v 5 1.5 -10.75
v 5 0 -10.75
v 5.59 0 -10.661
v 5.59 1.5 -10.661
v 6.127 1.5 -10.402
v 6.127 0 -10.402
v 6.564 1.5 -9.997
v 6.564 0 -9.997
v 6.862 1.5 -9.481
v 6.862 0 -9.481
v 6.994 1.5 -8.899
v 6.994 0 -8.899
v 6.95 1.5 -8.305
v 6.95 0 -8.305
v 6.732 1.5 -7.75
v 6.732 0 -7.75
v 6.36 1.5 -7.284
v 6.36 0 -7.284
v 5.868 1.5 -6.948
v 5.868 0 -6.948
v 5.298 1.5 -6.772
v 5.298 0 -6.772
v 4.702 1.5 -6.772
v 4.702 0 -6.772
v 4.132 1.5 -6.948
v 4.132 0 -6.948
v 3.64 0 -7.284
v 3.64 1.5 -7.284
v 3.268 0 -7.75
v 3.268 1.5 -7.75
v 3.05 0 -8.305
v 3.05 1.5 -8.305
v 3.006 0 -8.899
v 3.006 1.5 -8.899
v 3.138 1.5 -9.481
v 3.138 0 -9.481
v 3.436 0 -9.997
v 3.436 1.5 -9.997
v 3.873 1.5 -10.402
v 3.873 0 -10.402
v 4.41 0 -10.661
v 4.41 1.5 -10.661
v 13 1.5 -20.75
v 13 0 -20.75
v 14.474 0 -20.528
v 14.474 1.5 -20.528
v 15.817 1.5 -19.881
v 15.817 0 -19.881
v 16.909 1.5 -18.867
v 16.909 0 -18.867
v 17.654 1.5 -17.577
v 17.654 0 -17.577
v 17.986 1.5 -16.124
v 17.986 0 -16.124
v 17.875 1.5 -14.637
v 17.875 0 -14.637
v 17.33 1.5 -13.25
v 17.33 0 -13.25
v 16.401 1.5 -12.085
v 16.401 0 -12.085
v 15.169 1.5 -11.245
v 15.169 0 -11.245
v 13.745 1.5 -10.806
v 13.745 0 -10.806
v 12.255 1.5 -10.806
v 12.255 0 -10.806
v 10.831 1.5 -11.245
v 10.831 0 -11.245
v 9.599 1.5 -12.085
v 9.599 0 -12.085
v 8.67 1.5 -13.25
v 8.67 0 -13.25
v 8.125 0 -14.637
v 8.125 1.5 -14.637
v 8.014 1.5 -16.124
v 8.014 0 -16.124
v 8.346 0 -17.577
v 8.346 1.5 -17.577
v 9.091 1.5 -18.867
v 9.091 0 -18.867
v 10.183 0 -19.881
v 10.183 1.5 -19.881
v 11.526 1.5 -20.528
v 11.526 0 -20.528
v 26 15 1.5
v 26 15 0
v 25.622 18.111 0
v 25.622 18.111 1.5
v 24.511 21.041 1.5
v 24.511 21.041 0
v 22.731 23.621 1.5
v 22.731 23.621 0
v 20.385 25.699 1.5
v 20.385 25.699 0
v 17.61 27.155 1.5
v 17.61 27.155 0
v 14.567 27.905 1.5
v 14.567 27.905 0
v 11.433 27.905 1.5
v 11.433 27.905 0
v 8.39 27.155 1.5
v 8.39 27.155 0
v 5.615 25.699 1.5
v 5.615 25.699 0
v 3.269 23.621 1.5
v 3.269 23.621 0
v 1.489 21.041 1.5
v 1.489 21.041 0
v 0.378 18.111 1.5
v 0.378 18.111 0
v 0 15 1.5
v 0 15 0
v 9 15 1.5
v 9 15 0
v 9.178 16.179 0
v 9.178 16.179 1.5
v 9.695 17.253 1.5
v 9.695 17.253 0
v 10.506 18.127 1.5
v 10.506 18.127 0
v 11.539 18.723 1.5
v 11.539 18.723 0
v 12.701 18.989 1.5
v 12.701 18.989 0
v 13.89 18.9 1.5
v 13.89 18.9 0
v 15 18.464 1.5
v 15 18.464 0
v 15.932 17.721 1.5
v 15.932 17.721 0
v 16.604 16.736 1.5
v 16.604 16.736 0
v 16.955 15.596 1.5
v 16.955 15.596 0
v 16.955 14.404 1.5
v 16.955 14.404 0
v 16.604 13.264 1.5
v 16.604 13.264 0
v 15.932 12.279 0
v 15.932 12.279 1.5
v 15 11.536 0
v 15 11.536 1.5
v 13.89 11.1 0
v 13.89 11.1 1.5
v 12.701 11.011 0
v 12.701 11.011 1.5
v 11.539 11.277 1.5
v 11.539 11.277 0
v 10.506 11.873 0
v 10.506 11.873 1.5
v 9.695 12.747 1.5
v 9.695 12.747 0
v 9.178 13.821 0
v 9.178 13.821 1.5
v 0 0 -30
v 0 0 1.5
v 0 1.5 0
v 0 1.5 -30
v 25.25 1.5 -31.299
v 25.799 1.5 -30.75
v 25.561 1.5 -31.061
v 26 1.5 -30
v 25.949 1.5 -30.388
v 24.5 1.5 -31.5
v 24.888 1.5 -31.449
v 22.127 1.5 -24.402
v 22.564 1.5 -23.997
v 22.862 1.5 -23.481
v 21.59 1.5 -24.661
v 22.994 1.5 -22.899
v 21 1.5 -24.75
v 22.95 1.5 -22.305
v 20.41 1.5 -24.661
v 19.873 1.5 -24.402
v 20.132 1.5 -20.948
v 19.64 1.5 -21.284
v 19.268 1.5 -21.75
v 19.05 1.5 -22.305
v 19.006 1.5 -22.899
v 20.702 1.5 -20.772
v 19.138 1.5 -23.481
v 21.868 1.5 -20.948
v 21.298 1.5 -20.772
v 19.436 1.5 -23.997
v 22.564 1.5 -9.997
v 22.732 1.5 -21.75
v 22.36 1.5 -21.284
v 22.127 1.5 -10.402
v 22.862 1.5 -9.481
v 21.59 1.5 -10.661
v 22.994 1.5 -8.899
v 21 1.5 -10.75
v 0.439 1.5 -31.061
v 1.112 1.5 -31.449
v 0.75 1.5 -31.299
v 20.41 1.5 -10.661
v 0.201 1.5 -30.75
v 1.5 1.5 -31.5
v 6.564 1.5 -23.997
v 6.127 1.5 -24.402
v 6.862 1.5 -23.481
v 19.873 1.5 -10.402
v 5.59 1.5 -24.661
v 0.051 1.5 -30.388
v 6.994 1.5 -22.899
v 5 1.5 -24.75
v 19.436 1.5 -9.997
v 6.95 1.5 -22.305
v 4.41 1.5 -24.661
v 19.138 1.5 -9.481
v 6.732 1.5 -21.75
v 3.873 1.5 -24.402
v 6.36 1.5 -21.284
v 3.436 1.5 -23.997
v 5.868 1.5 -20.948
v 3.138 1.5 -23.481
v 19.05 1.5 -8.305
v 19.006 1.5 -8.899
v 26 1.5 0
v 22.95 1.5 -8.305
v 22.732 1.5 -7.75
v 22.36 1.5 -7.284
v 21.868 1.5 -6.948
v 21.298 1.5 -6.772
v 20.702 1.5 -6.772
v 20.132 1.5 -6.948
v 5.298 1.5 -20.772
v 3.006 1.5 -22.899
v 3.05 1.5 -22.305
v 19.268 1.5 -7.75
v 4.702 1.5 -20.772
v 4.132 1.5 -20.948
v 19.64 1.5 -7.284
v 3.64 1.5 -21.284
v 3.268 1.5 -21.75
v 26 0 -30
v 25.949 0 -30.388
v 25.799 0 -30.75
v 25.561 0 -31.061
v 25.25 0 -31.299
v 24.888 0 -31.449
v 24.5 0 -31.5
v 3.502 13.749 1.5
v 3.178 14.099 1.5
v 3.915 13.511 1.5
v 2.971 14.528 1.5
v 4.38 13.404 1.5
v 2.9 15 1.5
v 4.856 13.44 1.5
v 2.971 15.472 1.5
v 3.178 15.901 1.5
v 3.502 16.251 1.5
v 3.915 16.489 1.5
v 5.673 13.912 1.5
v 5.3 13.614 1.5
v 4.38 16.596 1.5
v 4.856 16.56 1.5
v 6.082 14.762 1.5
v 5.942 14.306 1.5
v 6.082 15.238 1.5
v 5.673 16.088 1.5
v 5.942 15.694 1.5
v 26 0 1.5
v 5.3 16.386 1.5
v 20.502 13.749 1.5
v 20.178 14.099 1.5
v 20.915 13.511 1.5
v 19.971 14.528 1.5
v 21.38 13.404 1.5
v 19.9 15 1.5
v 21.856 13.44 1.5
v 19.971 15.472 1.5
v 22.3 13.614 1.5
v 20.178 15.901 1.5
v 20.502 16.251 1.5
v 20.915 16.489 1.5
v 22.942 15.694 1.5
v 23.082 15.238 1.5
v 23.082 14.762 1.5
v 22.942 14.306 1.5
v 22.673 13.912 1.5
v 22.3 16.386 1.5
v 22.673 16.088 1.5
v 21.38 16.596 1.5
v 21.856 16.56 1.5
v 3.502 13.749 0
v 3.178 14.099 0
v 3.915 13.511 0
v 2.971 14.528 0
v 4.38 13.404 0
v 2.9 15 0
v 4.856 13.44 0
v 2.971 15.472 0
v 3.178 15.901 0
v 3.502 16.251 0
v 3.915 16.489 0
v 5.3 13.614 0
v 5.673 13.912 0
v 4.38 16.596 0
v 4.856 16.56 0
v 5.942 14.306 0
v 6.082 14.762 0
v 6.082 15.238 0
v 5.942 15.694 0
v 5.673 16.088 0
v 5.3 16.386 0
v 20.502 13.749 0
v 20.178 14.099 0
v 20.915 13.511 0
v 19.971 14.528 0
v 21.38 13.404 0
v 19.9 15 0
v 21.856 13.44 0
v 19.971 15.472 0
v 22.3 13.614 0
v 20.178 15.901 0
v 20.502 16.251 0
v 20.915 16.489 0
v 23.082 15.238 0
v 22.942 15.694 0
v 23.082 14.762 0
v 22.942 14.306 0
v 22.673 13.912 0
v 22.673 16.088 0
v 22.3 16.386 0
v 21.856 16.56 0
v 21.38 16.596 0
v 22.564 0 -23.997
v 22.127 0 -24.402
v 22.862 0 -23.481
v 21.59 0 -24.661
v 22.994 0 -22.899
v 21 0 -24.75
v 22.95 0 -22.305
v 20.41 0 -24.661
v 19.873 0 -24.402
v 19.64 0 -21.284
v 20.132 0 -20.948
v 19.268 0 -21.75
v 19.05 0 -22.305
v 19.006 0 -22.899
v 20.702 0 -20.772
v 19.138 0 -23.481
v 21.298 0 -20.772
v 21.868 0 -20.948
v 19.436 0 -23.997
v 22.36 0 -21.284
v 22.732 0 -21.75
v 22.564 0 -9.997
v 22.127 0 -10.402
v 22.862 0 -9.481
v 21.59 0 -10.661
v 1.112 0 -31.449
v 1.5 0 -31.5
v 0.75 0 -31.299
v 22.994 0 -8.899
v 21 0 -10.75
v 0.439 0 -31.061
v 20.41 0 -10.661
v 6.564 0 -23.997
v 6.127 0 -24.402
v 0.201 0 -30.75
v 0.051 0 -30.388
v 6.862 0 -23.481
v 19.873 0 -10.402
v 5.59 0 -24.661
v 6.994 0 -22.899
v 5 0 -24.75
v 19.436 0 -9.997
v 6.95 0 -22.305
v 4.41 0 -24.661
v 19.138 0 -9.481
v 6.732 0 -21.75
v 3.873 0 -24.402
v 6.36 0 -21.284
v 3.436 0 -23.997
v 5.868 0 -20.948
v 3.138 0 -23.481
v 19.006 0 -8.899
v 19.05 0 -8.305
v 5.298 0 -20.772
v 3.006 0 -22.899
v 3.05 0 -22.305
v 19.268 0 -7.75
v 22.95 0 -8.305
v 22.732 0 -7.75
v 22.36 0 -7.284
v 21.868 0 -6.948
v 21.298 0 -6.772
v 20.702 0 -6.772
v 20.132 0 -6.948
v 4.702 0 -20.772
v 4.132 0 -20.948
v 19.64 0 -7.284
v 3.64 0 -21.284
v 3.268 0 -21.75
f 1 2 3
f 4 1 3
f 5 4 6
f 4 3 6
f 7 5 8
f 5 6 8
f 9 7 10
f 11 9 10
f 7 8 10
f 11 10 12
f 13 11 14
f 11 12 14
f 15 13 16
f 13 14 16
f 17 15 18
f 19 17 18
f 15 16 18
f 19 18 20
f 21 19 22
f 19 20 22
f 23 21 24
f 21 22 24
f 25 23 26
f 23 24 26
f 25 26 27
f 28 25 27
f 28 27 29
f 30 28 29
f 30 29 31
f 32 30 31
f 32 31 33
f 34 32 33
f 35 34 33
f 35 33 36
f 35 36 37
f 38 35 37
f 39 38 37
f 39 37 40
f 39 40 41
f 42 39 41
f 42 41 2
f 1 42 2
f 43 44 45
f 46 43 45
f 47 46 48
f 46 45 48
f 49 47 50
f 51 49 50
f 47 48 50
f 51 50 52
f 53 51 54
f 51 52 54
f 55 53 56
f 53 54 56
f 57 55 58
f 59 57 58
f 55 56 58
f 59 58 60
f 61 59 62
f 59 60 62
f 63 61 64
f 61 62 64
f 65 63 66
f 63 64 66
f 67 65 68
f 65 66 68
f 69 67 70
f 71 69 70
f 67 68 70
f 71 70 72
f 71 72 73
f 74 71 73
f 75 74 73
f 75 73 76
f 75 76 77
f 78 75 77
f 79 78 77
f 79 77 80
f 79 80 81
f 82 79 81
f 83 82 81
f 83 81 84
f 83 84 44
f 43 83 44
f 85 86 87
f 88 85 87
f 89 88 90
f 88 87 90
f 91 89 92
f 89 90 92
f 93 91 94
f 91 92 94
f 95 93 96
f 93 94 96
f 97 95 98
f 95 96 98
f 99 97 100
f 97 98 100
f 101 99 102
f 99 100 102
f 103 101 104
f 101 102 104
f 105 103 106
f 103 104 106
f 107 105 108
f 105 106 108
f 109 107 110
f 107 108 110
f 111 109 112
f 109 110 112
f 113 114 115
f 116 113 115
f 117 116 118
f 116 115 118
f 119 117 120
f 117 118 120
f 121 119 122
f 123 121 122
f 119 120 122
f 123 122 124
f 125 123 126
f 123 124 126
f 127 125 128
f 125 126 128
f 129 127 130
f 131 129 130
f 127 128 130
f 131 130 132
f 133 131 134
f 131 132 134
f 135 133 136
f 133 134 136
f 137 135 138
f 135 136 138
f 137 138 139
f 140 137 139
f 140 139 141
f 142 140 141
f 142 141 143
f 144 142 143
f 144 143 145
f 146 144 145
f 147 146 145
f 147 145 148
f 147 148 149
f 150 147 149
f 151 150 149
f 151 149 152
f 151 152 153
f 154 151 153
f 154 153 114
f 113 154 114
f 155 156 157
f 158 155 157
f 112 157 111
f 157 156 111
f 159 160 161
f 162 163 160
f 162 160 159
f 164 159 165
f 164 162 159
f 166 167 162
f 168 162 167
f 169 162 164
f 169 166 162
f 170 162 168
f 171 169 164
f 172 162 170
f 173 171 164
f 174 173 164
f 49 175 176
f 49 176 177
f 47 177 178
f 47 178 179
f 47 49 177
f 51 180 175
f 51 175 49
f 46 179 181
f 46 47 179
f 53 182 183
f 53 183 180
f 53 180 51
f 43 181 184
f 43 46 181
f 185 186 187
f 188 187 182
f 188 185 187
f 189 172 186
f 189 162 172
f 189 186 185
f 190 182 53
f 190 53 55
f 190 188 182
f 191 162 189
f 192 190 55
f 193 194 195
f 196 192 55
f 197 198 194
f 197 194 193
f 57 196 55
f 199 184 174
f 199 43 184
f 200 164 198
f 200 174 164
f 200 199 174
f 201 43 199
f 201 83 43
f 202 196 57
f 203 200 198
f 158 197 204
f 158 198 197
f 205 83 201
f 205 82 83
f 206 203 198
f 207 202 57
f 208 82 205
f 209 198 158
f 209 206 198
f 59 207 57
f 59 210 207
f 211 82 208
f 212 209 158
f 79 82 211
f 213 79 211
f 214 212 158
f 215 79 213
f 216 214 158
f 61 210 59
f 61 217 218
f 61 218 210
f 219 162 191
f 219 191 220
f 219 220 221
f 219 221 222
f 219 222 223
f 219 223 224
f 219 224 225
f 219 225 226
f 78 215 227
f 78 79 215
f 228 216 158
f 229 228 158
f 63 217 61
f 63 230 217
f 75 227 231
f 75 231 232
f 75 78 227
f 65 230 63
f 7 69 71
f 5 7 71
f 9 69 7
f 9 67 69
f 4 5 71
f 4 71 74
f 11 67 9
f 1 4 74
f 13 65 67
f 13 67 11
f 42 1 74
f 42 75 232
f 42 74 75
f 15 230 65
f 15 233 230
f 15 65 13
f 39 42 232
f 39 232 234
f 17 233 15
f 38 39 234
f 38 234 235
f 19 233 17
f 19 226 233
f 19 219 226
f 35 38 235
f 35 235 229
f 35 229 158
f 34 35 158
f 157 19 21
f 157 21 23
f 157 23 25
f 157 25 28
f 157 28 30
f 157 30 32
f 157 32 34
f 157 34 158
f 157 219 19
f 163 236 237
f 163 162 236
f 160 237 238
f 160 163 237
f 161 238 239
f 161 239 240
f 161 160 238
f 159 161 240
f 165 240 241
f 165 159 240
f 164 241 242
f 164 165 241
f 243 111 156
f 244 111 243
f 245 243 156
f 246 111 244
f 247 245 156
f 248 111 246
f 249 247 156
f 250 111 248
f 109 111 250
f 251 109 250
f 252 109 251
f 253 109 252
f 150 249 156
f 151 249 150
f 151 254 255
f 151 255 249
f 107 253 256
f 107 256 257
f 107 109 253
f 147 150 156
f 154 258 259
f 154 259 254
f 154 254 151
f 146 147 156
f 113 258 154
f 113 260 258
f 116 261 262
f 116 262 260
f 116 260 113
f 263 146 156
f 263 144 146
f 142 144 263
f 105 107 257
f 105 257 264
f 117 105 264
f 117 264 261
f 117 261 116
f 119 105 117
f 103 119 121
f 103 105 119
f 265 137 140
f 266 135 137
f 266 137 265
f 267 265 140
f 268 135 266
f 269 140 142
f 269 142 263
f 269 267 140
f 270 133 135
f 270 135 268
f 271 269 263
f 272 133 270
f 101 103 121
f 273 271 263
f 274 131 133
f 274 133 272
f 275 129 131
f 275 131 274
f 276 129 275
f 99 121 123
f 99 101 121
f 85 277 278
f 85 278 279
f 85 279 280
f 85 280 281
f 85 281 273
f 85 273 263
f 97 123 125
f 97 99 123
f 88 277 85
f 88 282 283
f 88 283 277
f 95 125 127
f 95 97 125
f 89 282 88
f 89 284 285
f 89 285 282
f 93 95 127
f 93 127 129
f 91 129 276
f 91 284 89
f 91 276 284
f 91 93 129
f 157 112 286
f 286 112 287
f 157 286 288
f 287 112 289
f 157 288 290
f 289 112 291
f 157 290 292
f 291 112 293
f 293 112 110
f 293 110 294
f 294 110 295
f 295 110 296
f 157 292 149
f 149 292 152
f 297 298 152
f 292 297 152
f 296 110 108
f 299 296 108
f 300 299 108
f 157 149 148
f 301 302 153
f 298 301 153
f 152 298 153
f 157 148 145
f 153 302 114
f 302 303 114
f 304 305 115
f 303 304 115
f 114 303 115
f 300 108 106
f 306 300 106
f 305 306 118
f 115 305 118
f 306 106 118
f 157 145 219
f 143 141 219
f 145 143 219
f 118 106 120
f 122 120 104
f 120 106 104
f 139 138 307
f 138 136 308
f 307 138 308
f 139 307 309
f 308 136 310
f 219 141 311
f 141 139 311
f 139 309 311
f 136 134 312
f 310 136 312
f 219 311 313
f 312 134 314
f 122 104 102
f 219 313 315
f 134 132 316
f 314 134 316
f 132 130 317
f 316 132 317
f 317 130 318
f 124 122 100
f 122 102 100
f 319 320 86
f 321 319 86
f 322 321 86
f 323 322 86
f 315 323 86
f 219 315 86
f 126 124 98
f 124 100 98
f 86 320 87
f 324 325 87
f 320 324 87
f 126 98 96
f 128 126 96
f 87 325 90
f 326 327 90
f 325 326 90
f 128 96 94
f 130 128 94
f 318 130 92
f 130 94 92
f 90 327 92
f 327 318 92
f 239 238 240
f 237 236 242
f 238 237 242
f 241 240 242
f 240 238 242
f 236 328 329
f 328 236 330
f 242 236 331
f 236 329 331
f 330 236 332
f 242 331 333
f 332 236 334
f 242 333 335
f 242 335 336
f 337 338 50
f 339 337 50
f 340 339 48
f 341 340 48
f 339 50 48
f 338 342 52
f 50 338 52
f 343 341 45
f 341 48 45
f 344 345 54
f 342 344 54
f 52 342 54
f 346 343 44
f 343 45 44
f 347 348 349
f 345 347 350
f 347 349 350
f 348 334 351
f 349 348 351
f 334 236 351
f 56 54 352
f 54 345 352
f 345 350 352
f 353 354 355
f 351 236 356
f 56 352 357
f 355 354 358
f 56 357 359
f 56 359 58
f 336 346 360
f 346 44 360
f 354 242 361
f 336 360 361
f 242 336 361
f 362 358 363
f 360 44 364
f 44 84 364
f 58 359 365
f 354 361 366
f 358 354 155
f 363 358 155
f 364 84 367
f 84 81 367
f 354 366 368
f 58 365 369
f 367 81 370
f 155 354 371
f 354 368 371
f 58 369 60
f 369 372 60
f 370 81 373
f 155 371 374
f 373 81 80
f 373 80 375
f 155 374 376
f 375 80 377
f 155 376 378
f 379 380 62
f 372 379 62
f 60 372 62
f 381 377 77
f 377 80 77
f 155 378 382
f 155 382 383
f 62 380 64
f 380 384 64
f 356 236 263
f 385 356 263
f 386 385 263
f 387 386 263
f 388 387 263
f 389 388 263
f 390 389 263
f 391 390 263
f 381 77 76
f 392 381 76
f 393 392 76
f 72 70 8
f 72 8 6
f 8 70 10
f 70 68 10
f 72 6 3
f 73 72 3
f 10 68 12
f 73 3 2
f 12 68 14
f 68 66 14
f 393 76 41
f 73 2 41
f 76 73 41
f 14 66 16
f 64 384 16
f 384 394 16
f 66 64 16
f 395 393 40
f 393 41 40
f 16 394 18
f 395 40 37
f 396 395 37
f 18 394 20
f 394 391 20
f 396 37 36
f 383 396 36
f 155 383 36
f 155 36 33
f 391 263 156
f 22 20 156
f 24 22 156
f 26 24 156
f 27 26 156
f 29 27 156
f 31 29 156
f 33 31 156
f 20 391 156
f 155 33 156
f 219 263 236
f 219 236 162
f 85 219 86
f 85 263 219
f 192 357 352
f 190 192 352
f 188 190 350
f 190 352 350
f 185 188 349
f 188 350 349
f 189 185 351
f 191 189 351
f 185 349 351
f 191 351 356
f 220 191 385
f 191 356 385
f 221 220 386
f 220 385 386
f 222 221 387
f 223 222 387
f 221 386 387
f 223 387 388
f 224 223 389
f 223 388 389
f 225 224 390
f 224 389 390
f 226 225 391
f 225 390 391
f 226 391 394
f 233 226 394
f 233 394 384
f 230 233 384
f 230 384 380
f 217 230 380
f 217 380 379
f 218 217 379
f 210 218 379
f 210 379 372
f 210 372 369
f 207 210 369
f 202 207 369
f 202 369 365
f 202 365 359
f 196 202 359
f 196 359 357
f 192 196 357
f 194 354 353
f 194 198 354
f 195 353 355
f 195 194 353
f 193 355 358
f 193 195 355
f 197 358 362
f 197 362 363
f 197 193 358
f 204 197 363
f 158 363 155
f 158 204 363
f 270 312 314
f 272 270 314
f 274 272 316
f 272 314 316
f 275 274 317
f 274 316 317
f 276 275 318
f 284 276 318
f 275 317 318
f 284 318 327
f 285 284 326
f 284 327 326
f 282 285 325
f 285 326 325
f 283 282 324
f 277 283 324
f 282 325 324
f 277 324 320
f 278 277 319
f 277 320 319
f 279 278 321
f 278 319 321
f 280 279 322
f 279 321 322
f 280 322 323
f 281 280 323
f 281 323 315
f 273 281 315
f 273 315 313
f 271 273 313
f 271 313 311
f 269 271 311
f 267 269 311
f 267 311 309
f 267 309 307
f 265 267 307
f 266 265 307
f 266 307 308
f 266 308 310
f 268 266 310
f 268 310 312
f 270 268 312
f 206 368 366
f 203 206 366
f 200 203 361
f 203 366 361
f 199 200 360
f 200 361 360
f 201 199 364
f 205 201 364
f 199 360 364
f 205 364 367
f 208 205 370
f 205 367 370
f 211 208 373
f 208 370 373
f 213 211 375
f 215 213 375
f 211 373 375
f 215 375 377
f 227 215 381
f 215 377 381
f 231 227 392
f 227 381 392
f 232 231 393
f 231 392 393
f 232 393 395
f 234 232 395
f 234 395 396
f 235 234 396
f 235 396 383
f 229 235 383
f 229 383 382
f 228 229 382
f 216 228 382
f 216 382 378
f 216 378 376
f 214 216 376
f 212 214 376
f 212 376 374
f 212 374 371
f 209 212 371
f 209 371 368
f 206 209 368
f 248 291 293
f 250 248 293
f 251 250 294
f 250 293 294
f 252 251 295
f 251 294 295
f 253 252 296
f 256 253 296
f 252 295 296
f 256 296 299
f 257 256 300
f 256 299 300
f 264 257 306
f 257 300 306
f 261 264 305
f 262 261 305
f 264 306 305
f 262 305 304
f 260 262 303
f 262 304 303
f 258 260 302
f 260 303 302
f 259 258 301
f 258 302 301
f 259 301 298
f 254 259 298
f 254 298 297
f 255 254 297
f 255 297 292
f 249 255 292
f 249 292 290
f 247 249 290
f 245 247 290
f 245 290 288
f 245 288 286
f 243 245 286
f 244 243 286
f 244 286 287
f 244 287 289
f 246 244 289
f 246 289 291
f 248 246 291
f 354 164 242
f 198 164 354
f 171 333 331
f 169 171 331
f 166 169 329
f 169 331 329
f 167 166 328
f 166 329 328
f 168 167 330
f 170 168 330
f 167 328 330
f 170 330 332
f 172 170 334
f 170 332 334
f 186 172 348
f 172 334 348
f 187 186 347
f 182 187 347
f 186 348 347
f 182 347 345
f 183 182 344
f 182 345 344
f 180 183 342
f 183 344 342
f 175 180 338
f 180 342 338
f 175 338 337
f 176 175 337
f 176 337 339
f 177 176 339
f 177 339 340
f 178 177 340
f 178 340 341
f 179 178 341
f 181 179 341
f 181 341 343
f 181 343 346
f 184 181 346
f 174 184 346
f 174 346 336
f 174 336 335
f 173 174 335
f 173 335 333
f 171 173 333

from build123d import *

# Parameters (mm, degrees)
BOSS_EXTRUDE1_DEPTH = 1.5
SKETCH2_R           = 1.6
SKETCH2_R_2         = 4
CUT_EXTRUDE1_DEPTH  = 39.23937761
SKETCH3_W           = 26
SKETCH3_H           = 1.5
BOSS_EXTRUDE4_DEPTH = 31.5
SKETCH4_R           = 5
SKETCH4_R_2         = 2
CUT_EXTRUDE2_DEPTH  = 50.520197899
FILLET1_R           = 1.5


with BuildPart() as part:
    # Sketch1 → Boss-Extrude1 (new body)
    with BuildSketch(Plane.XY):
        with BuildLine():
            Line((0, 0), (26, 0))
            Line((26, 0), (26, 15))
            ThreePointArc((26, 15), (13, 28), (0, 15))
            Line((0, 15), (0, 0))
        make_face()
    extrude(amount=BOSS_EXTRUDE1_DEPTH)

    # Sketch2 → Cut-Extrude1 (cut, through all)
    with BuildSketch(Plane(origin=(0, 0, 0), x_dir=(-1, 0, 0), z_dir=(0, 0, -1))):
        with Locations((-21.5, 15)):
            Circle(SKETCH2_R)
        with Locations((-13, 15)):
            Circle(SKETCH2_R_2)
        with Locations((-4.5, 15)):
            Circle(SKETCH2_R)
    extrude(amount=-CUT_EXTRUDE1_DEPTH, mode=Mode.SUBTRACT)

    # Sketch3 → Boss-Extrude4 (add)
    with BuildSketch(Plane(origin=(0, 0, 0), x_dir=(-1, 0, 0), z_dir=(0, 0, -1))):
        with Locations((-13, 0.75)):
            Rectangle(SKETCH3_W, SKETCH3_H)
    extrude(amount=BOSS_EXTRUDE4_DEPTH)

    # Sketch4 → Cut-Extrude2 (cut, through all)
    with BuildSketch(Plane.XZ):
        with Locations(Location((13, -15.75, 0), (0, 0, 270))):
            Circle(SKETCH4_R)
        with Locations(Location((5, -8.75, 0), (0, 0, 270))):
            Circle(SKETCH4_R_2)
        with Locations(Location((21, -8.75, 0), (0, 0, 270))):
            Circle(SKETCH4_R_2)
        with Locations(Location((21, -22.75, 0), (0, 0, 270))):
            Circle(SKETCH4_R_2)
        with Locations(Location((5, -22.75, 0), (0, 0, 270))):
            Circle(SKETCH4_R_2)
    extrude(amount=-CUT_EXTRUDE2_DEPTH, mode=Mode.SUBTRACT)

    # Fillet1
    fillet1_edges = [part.edges().sort_by_distance(p)[0] for p in [
        (26, 0.75, -31.5),
        (0, 0.75, -31.5),
    ]]
    fillet(fillet1_edges, radius=FILLET1_R)


solid = part.part
